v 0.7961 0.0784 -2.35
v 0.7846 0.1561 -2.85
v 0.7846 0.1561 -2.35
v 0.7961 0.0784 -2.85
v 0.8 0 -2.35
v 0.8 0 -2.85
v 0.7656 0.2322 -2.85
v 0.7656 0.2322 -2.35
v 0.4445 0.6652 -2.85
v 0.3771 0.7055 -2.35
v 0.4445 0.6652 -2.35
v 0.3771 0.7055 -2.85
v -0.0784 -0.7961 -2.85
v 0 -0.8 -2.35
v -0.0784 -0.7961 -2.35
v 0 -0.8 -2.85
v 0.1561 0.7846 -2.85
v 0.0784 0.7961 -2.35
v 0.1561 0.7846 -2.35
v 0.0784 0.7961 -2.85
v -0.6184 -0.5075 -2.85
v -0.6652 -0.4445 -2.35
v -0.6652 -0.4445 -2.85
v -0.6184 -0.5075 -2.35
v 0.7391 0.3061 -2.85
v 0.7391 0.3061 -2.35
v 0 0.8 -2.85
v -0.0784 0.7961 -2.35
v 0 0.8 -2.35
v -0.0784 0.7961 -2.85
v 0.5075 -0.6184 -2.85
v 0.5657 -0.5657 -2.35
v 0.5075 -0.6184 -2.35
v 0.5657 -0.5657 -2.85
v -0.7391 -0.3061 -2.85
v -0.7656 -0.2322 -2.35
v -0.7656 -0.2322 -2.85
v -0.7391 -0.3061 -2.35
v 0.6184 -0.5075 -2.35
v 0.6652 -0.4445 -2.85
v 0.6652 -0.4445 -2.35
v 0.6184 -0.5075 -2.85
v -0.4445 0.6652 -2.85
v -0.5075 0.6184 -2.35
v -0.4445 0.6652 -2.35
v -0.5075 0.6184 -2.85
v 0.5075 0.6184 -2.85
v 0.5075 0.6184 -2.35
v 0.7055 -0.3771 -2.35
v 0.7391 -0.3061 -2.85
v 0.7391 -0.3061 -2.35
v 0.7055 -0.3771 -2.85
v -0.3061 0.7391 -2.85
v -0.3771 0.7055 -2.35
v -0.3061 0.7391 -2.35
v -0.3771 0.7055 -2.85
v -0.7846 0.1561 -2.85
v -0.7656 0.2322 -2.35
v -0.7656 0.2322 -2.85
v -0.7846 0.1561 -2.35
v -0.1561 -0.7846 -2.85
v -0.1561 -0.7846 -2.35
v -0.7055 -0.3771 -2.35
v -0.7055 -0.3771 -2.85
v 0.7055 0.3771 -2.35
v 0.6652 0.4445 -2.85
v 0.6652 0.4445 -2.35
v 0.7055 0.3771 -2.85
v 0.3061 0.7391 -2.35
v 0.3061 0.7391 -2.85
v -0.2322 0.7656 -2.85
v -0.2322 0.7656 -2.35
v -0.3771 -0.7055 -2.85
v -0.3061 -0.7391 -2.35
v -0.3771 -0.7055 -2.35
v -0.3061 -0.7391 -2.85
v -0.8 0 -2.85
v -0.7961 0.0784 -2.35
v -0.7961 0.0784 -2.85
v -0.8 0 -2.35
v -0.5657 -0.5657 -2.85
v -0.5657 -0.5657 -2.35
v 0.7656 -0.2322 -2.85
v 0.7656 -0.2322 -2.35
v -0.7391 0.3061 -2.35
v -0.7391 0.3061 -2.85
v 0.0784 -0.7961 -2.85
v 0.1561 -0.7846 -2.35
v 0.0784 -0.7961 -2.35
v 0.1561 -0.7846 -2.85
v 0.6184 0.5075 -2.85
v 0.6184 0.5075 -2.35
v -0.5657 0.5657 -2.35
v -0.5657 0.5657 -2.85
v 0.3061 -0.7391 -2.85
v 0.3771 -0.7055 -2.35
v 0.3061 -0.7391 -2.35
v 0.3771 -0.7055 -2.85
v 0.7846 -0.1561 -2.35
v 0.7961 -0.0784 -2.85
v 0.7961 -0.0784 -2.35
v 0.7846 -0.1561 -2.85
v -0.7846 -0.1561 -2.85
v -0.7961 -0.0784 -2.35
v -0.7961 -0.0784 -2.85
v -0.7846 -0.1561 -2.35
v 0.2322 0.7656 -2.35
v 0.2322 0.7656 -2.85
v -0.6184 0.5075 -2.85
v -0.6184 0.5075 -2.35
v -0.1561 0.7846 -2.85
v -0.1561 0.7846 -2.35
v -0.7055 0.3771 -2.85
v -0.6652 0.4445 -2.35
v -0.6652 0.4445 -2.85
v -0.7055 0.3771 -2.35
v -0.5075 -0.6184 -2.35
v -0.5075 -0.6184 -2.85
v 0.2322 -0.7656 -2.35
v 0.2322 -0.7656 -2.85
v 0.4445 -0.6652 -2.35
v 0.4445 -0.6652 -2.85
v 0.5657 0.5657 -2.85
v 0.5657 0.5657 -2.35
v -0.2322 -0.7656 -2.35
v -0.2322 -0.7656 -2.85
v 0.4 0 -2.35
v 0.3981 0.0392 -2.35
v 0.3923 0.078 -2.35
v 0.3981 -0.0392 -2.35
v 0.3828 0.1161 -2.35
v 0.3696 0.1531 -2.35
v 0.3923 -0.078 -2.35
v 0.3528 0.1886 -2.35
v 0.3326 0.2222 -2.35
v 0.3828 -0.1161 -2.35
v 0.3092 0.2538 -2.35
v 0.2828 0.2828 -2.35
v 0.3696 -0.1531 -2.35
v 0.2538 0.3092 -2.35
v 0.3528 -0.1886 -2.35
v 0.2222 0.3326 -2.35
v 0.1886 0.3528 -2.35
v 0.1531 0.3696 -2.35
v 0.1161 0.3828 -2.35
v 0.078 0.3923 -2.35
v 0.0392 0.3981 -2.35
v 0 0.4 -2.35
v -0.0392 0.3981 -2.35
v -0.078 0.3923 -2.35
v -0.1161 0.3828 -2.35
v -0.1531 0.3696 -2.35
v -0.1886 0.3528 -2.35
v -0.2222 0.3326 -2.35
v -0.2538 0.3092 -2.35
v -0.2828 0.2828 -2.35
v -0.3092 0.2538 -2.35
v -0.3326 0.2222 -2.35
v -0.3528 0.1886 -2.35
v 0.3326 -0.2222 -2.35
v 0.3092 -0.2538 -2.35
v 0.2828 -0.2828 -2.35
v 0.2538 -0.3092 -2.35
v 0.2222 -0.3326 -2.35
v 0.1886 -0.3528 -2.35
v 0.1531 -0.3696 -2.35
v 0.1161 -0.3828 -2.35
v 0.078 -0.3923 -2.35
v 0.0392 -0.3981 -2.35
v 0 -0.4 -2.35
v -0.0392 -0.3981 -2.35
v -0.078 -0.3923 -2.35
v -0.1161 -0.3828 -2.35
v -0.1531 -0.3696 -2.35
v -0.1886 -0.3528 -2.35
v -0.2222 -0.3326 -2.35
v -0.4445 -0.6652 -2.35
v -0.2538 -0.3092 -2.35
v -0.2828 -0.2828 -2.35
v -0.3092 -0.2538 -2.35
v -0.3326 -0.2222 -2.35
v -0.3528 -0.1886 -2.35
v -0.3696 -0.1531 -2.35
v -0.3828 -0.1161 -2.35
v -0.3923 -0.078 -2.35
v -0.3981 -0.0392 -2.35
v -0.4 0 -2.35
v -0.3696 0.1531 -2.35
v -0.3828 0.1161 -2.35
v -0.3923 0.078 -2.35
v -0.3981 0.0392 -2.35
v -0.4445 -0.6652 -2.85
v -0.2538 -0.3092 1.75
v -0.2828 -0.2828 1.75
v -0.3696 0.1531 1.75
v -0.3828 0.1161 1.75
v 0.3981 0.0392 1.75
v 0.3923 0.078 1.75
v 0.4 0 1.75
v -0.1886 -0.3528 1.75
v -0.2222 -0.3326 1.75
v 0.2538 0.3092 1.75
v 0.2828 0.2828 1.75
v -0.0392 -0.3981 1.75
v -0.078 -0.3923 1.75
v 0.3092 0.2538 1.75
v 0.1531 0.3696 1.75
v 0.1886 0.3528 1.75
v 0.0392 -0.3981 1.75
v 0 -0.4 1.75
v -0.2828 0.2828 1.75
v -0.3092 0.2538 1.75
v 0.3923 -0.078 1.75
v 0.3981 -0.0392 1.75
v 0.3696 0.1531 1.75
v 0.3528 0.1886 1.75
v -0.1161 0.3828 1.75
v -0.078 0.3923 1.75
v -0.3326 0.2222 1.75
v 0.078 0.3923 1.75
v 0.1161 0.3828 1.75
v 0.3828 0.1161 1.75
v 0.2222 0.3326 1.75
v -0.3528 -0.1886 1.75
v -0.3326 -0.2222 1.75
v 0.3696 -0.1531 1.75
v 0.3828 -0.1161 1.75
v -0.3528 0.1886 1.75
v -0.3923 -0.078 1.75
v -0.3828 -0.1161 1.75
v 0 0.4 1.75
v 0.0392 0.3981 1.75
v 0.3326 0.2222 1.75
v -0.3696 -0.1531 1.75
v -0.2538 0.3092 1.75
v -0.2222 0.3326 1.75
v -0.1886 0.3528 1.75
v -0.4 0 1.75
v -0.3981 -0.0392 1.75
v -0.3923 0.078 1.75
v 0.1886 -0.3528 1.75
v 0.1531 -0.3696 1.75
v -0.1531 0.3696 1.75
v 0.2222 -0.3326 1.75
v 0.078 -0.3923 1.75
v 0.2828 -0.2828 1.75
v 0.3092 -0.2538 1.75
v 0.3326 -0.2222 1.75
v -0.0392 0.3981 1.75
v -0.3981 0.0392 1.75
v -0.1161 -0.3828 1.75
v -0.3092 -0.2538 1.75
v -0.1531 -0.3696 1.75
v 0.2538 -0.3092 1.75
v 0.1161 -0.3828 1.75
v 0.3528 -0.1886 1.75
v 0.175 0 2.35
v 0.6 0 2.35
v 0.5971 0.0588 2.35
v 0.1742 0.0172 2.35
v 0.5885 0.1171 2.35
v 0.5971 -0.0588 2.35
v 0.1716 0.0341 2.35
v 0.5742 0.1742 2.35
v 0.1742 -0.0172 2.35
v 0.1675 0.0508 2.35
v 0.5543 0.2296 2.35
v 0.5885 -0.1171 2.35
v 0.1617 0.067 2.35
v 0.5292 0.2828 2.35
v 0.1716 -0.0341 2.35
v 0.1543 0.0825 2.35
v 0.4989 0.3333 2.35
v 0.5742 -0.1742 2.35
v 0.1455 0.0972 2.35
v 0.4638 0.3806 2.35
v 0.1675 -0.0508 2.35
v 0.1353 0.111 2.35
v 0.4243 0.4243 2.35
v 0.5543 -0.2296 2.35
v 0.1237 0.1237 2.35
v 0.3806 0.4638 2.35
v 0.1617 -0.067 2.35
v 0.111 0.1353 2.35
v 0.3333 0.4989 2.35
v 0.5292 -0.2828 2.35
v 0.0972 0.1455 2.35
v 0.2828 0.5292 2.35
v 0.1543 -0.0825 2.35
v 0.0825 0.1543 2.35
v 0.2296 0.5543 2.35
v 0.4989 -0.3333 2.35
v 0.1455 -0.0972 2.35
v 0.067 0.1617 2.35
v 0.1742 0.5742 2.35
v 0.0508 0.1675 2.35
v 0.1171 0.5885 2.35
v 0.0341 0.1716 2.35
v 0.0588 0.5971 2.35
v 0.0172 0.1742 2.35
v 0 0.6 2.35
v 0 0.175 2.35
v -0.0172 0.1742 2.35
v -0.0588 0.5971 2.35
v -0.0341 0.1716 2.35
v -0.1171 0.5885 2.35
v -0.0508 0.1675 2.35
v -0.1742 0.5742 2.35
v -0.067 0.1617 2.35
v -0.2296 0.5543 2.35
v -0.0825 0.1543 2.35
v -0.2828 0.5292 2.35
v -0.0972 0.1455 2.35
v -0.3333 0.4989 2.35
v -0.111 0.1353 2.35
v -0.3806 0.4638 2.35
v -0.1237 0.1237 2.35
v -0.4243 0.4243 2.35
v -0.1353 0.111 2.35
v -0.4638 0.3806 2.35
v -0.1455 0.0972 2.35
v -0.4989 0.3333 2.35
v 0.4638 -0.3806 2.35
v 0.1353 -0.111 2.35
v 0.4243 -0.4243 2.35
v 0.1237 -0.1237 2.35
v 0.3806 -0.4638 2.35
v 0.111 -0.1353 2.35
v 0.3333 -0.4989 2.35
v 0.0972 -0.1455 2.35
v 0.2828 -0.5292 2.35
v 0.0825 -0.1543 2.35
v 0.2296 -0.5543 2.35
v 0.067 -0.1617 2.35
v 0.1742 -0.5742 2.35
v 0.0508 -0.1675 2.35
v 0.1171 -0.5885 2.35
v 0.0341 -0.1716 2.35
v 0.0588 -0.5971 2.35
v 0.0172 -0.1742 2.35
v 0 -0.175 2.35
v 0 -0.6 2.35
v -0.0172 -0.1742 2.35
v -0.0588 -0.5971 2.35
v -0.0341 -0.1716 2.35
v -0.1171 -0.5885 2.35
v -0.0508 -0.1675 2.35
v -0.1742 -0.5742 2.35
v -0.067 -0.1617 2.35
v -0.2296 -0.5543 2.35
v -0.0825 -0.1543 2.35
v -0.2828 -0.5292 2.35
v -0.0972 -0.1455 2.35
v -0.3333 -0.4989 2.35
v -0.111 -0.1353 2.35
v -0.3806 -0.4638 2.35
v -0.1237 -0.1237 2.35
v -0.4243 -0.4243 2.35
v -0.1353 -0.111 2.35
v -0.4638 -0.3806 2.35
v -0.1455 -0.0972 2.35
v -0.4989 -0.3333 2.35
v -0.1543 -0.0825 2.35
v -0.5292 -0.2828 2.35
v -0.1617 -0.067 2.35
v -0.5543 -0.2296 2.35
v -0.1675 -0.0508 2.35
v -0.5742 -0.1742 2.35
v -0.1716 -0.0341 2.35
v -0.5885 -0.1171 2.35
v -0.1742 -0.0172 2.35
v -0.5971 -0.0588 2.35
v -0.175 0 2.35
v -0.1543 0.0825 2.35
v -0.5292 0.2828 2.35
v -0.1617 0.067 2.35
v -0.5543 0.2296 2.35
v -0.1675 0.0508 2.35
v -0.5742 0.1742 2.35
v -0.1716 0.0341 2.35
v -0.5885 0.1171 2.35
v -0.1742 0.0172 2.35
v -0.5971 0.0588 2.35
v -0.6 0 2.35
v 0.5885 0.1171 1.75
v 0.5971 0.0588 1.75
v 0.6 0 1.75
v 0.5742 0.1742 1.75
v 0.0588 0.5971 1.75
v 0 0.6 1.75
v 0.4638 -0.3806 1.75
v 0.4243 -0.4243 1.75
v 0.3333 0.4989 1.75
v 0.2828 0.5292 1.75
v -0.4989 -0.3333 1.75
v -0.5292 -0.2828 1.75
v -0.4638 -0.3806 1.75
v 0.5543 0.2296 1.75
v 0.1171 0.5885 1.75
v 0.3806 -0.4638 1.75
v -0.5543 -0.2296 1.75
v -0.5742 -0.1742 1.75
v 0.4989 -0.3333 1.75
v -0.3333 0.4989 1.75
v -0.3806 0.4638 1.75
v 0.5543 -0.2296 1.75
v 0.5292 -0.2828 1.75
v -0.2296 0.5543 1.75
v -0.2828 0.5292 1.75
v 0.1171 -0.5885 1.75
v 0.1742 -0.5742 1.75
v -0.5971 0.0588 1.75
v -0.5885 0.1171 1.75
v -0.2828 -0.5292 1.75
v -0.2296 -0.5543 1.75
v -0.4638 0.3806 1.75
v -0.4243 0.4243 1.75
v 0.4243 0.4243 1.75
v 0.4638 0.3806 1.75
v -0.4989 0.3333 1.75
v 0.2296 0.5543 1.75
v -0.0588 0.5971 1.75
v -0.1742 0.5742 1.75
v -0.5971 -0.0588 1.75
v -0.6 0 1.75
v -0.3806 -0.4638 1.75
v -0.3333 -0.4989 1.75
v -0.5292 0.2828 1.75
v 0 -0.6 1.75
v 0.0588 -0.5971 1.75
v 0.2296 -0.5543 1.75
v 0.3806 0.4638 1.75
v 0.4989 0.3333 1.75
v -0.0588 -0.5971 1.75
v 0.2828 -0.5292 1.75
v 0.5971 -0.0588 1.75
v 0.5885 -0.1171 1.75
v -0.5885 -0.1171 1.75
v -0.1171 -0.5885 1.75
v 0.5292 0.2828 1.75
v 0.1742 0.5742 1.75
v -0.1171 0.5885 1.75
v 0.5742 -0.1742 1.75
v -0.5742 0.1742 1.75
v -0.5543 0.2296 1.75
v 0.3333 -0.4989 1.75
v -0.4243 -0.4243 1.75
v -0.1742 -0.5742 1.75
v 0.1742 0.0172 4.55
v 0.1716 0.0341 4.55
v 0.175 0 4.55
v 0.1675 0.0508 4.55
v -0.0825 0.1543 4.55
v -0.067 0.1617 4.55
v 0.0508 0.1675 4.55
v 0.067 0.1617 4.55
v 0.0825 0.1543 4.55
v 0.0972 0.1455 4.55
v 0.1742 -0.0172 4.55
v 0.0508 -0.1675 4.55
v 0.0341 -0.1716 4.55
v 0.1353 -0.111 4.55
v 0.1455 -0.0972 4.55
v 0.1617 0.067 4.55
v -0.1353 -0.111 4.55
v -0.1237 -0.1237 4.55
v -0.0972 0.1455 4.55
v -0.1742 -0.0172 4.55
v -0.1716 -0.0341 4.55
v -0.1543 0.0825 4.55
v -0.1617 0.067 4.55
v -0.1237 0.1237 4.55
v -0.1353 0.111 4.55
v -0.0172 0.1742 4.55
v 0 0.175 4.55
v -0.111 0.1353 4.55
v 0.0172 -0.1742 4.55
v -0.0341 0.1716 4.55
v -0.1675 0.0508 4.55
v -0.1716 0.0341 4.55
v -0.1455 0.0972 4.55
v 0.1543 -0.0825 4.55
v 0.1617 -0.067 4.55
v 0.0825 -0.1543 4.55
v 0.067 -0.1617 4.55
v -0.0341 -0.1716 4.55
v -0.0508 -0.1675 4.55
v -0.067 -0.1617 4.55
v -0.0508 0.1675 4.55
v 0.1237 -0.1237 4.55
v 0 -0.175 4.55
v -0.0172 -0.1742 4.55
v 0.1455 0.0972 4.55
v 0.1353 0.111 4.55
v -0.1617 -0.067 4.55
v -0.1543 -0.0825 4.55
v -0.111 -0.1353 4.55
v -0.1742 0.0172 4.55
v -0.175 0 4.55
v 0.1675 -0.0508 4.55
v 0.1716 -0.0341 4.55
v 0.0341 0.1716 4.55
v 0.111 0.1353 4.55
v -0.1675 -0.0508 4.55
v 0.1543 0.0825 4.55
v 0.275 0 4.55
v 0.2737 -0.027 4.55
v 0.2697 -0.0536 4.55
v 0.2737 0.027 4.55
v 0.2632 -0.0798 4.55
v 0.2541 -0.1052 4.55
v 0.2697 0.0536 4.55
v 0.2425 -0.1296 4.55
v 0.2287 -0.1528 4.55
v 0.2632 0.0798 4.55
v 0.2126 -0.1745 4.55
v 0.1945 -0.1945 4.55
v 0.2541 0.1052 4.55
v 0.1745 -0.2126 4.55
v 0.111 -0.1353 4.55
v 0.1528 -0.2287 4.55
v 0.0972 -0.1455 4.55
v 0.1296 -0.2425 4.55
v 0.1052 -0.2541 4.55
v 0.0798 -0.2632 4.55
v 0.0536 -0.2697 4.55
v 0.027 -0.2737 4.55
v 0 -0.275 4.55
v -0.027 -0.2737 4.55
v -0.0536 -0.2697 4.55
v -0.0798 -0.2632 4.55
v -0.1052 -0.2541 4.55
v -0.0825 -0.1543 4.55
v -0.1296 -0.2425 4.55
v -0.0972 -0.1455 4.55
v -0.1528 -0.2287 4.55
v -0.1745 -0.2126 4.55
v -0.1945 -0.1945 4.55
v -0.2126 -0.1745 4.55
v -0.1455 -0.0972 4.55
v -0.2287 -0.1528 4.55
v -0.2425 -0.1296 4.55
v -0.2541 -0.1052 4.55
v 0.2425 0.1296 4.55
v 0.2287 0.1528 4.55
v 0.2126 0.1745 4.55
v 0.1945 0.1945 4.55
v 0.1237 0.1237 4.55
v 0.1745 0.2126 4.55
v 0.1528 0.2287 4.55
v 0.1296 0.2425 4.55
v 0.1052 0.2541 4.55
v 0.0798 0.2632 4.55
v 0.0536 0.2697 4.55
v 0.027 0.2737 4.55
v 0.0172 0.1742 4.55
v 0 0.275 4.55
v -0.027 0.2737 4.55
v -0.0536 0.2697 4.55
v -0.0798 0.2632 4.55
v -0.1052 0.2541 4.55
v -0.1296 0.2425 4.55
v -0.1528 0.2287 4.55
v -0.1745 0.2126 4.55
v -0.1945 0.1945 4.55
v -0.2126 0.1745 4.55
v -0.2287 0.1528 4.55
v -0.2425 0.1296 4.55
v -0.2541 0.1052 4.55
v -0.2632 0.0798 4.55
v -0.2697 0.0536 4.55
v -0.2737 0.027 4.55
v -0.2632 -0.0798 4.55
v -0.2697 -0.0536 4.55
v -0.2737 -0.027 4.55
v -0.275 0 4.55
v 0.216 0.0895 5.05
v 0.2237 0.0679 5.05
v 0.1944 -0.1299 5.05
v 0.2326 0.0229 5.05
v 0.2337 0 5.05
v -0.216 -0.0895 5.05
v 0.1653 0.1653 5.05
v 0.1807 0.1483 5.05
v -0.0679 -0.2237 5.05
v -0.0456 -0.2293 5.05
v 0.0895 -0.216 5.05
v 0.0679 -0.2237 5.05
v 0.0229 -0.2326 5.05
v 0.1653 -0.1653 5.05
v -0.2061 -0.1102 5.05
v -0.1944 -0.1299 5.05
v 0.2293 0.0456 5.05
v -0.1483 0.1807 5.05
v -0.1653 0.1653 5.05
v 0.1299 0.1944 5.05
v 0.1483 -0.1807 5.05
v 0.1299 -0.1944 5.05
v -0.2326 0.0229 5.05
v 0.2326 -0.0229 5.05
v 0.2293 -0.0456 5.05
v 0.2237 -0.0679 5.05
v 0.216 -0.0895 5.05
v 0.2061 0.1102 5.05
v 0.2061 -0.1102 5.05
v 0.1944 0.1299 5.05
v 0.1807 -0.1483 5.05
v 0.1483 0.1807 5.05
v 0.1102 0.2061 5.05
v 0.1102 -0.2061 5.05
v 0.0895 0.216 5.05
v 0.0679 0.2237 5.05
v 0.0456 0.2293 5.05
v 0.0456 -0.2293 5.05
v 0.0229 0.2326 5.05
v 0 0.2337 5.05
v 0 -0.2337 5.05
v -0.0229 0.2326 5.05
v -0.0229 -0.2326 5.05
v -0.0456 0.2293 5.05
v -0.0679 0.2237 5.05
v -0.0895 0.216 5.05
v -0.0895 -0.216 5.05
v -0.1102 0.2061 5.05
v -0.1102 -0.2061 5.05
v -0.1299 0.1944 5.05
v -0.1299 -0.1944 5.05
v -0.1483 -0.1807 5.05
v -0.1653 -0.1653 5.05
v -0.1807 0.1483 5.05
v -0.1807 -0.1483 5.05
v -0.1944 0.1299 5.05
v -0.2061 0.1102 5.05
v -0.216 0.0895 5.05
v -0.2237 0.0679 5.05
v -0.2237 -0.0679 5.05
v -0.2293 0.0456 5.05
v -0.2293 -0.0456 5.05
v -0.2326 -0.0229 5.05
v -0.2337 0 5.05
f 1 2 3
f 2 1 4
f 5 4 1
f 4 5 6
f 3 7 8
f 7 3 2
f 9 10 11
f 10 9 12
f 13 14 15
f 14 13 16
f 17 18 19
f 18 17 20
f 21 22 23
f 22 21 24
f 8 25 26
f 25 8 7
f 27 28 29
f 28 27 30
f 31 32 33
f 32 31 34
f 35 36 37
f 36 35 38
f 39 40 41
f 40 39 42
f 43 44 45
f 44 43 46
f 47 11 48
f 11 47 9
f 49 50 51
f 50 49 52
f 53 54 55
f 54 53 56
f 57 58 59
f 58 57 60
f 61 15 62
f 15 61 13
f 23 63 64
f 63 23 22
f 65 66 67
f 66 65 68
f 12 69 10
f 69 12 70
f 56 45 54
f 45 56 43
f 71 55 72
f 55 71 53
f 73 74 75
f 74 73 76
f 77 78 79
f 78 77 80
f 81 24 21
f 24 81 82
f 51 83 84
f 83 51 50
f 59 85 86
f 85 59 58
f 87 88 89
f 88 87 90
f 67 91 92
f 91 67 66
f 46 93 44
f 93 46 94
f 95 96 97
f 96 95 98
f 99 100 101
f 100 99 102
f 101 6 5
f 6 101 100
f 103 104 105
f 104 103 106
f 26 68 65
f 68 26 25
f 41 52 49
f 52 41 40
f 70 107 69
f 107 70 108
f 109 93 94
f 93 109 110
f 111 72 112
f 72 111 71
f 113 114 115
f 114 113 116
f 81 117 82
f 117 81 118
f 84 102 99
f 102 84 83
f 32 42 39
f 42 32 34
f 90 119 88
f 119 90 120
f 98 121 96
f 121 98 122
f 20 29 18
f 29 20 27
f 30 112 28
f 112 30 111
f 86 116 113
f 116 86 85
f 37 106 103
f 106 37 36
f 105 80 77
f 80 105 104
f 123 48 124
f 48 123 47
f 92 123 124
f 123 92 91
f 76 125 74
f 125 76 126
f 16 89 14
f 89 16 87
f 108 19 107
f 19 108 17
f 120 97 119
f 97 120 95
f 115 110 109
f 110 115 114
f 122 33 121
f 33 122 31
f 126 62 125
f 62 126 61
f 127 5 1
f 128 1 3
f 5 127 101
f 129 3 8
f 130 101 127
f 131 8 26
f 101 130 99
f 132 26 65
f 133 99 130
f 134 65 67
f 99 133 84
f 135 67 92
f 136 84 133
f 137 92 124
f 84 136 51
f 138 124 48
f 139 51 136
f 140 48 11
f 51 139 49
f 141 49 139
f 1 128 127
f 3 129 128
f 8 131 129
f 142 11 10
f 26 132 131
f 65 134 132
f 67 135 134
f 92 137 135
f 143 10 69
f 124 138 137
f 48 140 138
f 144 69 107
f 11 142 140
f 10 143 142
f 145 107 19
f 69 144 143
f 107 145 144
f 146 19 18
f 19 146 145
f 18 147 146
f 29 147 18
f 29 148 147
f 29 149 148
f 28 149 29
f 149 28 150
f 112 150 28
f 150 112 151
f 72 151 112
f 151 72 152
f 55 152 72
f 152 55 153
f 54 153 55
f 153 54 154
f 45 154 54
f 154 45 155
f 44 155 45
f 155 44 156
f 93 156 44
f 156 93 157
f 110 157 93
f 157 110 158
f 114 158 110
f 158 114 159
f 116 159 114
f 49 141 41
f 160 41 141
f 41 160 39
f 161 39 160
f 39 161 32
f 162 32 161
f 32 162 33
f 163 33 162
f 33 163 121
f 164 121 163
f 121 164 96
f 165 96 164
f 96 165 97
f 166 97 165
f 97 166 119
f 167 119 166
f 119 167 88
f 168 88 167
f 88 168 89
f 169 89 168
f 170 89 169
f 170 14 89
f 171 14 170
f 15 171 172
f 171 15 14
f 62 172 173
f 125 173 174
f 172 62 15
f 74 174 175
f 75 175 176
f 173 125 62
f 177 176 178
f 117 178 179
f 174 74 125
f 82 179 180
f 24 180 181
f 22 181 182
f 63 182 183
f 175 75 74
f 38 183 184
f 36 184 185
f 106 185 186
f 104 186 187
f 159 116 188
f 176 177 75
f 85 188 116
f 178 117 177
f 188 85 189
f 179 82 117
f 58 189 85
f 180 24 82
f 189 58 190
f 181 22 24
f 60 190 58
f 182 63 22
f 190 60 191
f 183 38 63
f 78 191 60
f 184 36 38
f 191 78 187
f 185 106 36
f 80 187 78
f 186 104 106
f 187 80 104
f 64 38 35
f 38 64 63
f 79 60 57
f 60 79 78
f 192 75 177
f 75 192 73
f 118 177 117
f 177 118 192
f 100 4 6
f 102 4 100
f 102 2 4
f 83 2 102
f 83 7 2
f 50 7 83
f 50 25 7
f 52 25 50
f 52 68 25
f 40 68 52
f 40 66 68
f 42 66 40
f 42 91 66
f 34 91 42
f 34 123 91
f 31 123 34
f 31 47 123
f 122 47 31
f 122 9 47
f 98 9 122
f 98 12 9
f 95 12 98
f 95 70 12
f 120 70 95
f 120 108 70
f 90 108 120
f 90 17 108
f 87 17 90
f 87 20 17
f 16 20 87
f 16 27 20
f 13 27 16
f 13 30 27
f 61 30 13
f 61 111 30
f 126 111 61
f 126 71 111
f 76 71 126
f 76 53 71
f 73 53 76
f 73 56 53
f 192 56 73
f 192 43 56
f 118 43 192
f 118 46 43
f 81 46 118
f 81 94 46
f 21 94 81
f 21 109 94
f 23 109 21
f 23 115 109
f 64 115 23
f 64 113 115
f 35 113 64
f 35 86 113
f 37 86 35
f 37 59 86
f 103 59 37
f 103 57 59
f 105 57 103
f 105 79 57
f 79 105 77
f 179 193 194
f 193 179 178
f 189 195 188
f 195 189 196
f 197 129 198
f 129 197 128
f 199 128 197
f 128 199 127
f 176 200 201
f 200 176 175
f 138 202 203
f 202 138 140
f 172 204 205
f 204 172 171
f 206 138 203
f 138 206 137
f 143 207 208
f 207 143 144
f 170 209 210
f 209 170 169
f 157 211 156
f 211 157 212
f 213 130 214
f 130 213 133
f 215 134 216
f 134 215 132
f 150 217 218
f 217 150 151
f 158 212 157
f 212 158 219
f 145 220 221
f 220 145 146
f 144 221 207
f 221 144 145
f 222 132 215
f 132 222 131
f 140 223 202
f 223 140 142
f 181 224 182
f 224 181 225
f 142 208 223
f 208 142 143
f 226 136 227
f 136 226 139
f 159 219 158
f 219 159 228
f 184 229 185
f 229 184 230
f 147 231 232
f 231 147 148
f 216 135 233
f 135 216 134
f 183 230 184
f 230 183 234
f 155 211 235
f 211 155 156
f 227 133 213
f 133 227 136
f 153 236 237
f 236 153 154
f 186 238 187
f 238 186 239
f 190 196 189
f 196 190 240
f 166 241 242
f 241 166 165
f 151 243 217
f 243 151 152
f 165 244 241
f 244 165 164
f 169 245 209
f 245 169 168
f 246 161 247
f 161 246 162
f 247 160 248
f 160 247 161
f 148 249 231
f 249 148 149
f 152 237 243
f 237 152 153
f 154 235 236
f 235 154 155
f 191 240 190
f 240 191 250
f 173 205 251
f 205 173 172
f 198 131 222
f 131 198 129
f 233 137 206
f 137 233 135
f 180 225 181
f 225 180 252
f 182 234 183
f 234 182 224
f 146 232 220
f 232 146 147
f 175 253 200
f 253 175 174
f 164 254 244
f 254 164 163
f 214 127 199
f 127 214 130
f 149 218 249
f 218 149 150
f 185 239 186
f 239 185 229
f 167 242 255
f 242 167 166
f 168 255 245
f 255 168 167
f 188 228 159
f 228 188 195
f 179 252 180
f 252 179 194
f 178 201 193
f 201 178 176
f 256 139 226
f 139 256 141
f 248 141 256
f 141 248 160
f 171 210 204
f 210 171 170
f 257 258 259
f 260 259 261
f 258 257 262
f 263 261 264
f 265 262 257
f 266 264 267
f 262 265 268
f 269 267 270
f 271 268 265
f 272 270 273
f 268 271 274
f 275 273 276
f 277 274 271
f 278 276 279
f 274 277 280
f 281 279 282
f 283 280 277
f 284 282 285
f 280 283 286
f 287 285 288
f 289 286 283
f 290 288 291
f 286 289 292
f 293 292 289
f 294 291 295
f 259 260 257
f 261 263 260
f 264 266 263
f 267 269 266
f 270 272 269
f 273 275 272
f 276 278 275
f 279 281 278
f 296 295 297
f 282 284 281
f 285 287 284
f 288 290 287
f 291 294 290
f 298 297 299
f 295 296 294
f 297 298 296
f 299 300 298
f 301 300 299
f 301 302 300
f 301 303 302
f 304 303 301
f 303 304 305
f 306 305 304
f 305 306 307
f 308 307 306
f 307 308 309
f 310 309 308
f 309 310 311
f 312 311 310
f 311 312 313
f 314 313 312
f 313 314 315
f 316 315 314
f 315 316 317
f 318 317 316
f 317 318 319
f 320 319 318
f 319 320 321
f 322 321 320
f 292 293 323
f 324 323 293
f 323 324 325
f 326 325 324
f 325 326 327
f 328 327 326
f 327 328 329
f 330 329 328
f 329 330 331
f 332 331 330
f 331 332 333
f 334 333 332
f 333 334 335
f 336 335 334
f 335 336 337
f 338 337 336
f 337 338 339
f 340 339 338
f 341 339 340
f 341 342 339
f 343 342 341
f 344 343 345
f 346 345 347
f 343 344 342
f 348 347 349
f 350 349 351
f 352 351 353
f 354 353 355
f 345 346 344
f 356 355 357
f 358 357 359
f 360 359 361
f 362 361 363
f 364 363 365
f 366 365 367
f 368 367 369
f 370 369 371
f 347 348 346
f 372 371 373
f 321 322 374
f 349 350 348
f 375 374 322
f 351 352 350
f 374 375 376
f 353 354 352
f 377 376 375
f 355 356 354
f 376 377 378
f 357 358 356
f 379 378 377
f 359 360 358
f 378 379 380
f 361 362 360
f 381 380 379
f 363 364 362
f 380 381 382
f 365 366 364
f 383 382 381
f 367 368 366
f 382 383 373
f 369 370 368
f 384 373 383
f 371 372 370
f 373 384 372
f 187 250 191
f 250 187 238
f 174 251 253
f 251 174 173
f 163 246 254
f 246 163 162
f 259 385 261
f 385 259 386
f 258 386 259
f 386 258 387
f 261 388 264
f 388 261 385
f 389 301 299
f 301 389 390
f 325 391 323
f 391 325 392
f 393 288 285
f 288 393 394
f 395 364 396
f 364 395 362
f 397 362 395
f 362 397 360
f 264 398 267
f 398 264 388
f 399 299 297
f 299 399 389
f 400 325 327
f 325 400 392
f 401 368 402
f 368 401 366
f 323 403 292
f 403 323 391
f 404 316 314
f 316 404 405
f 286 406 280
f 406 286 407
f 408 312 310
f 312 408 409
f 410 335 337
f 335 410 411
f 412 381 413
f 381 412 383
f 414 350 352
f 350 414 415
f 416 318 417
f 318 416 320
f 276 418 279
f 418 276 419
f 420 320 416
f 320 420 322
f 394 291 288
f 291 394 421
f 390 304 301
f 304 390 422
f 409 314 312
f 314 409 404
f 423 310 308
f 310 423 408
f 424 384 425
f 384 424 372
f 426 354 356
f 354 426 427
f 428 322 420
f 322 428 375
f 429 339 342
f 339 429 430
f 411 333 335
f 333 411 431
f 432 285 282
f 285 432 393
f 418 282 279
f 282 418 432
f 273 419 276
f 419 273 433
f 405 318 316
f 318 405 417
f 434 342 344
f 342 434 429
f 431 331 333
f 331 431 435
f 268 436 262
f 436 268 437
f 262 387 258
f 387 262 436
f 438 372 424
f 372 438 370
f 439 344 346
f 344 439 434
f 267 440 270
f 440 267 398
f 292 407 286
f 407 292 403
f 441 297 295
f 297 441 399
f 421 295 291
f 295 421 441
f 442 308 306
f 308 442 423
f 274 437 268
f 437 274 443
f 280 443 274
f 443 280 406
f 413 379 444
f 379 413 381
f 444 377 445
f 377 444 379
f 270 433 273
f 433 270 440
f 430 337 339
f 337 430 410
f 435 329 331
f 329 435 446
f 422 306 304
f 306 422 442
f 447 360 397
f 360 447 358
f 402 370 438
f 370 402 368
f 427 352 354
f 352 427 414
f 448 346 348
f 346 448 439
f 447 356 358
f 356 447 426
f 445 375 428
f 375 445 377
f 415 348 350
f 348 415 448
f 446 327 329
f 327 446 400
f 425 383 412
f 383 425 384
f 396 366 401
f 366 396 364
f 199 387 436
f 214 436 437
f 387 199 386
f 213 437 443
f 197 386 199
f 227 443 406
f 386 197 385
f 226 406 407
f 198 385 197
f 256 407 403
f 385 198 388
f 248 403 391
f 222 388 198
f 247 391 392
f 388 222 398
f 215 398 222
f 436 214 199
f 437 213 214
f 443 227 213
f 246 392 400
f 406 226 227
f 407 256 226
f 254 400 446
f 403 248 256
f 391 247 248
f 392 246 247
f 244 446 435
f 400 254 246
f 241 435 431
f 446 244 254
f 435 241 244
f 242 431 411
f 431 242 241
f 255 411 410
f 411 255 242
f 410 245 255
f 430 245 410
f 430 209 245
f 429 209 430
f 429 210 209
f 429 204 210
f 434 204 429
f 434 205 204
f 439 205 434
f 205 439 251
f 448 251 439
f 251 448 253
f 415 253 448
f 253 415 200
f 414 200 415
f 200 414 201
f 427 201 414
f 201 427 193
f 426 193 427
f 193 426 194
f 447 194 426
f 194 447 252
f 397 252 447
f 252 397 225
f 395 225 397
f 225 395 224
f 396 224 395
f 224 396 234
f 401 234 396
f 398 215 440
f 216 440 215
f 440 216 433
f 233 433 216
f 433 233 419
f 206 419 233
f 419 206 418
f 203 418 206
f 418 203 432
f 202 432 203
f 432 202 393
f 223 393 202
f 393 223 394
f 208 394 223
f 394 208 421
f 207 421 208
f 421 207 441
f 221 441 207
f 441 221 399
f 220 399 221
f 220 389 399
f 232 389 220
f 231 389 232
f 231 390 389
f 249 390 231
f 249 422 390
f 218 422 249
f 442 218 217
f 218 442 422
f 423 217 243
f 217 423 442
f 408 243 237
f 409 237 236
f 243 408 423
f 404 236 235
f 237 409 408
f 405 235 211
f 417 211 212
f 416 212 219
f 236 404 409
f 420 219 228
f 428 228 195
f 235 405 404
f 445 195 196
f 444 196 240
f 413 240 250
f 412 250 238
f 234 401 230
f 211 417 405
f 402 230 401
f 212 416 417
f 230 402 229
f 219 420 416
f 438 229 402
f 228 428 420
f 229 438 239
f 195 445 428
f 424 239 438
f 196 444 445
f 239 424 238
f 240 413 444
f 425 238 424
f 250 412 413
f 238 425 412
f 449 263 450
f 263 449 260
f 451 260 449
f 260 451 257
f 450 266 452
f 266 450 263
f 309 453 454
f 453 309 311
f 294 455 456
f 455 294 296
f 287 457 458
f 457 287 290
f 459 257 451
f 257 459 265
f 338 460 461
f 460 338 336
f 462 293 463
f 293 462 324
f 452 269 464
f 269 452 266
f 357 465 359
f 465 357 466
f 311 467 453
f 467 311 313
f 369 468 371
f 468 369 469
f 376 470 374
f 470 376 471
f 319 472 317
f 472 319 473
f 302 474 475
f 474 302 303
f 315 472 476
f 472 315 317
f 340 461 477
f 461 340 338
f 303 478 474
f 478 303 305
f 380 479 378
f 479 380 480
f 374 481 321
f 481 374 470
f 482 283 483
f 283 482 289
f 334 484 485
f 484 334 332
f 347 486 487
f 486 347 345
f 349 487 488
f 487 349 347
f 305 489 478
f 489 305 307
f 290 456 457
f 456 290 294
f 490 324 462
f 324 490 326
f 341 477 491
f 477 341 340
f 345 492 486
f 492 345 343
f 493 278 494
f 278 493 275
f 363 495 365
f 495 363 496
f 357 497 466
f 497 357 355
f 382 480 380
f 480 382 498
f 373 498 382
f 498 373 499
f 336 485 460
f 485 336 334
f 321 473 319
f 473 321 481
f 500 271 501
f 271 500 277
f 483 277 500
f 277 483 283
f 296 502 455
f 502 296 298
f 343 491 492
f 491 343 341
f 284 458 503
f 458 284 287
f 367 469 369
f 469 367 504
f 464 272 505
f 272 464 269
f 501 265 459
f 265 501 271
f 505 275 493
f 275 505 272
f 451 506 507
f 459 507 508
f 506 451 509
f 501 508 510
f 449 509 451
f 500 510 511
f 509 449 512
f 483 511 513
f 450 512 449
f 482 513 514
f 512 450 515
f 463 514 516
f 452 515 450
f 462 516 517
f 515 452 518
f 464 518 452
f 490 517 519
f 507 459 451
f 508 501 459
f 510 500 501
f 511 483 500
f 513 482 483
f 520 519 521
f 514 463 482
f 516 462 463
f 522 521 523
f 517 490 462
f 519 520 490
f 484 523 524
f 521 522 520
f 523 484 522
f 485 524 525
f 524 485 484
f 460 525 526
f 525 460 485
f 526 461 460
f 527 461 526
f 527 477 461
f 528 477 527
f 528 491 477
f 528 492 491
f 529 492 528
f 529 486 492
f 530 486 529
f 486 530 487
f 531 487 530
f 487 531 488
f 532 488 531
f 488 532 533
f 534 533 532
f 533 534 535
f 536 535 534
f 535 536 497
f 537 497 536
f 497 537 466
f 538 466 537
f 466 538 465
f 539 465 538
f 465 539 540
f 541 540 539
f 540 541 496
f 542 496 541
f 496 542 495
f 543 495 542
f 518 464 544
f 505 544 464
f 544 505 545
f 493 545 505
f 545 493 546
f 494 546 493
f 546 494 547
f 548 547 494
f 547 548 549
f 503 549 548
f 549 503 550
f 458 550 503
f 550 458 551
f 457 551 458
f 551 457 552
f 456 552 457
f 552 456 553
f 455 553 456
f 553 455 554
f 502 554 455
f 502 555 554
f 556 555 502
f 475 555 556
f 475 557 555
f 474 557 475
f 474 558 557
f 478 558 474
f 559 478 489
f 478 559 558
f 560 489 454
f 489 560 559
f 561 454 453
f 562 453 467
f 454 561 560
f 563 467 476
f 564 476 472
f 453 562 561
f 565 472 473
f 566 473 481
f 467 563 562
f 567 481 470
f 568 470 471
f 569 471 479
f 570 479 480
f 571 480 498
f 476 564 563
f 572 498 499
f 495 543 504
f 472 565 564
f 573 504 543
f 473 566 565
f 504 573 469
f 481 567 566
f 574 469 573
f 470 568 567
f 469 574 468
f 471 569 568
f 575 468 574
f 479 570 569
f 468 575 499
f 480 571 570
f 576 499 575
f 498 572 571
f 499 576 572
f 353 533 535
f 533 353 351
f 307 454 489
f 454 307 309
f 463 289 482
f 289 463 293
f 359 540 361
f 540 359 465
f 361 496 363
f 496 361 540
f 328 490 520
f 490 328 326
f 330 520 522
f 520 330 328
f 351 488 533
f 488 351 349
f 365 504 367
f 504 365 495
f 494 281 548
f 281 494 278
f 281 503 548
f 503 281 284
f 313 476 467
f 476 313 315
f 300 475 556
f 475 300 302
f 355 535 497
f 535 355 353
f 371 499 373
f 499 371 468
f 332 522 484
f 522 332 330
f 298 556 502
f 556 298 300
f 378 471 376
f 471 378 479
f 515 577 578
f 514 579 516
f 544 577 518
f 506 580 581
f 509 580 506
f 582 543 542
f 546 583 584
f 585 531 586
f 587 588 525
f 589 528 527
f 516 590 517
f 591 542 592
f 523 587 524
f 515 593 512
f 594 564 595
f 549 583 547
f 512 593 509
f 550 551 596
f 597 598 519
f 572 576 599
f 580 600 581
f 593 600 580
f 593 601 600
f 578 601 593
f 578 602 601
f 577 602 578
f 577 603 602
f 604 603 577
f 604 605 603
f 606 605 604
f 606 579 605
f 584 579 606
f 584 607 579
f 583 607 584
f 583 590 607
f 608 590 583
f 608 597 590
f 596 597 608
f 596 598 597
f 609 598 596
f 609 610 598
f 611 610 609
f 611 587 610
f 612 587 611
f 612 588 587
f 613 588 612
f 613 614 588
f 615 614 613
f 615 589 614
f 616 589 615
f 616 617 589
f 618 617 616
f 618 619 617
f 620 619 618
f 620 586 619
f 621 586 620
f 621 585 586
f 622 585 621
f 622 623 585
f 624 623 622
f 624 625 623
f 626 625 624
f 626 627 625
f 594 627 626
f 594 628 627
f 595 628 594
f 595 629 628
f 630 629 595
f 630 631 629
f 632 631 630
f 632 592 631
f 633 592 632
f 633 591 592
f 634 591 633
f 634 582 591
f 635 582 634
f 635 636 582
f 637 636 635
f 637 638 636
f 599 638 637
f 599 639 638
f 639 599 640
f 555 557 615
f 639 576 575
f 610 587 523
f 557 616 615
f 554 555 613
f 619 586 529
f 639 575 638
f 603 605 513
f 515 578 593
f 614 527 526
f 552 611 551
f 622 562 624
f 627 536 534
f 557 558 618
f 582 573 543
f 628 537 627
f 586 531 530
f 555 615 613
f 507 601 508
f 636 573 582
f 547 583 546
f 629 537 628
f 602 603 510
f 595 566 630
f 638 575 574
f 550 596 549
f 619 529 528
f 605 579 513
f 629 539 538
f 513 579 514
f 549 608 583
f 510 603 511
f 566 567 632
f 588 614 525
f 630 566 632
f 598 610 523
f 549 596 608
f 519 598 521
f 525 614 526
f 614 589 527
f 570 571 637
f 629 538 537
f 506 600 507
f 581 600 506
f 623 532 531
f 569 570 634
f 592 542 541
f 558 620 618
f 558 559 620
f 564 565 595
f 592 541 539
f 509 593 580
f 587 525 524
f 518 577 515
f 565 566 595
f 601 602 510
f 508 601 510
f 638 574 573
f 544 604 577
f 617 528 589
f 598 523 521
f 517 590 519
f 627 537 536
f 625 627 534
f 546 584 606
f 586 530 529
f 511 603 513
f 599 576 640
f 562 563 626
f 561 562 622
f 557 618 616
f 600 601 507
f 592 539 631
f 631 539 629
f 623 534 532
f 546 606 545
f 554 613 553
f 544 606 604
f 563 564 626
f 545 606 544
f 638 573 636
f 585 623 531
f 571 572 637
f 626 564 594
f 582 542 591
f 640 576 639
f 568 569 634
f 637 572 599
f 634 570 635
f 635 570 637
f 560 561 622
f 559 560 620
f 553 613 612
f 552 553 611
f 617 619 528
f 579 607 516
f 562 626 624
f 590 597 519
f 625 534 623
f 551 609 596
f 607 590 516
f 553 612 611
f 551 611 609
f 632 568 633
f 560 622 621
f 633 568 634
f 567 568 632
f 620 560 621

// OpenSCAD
$fn=64;

body_d = 0.8;
body_h = 4.7;

bushing_d = 1.2;
bushing_h = 0.6;

lever_d = 0.35;
lever_h = 2.2;

tip_d = 0.55;
tip_h = 0.5;

base_d = 1.6;
base_h = 0.5;

module toggle_switch() {
    union() {
        translate([0,0,-(body_h/2 + base_h)])
            cylinder(d=base_d, h=base_h, center=false);

        translate([0,0,-body_h/2])
            cylinder(d=body_d, h=body_h, center=false);

        translate([0,0,body_h/2 - bushing_h])
            cylinder(d=bushing_d, h=bushing_h, center=false);

        translate([0,0,body_h/2])
            cylinder(d=lever_d, h=lever_h, center=false);

        translate([0,0,body_h/2 + lever_h])
            cylinder(d1=tip_d, d2=tip_d*0.85, h=tip_h, center=false);
    }
}

toggle_switch();
